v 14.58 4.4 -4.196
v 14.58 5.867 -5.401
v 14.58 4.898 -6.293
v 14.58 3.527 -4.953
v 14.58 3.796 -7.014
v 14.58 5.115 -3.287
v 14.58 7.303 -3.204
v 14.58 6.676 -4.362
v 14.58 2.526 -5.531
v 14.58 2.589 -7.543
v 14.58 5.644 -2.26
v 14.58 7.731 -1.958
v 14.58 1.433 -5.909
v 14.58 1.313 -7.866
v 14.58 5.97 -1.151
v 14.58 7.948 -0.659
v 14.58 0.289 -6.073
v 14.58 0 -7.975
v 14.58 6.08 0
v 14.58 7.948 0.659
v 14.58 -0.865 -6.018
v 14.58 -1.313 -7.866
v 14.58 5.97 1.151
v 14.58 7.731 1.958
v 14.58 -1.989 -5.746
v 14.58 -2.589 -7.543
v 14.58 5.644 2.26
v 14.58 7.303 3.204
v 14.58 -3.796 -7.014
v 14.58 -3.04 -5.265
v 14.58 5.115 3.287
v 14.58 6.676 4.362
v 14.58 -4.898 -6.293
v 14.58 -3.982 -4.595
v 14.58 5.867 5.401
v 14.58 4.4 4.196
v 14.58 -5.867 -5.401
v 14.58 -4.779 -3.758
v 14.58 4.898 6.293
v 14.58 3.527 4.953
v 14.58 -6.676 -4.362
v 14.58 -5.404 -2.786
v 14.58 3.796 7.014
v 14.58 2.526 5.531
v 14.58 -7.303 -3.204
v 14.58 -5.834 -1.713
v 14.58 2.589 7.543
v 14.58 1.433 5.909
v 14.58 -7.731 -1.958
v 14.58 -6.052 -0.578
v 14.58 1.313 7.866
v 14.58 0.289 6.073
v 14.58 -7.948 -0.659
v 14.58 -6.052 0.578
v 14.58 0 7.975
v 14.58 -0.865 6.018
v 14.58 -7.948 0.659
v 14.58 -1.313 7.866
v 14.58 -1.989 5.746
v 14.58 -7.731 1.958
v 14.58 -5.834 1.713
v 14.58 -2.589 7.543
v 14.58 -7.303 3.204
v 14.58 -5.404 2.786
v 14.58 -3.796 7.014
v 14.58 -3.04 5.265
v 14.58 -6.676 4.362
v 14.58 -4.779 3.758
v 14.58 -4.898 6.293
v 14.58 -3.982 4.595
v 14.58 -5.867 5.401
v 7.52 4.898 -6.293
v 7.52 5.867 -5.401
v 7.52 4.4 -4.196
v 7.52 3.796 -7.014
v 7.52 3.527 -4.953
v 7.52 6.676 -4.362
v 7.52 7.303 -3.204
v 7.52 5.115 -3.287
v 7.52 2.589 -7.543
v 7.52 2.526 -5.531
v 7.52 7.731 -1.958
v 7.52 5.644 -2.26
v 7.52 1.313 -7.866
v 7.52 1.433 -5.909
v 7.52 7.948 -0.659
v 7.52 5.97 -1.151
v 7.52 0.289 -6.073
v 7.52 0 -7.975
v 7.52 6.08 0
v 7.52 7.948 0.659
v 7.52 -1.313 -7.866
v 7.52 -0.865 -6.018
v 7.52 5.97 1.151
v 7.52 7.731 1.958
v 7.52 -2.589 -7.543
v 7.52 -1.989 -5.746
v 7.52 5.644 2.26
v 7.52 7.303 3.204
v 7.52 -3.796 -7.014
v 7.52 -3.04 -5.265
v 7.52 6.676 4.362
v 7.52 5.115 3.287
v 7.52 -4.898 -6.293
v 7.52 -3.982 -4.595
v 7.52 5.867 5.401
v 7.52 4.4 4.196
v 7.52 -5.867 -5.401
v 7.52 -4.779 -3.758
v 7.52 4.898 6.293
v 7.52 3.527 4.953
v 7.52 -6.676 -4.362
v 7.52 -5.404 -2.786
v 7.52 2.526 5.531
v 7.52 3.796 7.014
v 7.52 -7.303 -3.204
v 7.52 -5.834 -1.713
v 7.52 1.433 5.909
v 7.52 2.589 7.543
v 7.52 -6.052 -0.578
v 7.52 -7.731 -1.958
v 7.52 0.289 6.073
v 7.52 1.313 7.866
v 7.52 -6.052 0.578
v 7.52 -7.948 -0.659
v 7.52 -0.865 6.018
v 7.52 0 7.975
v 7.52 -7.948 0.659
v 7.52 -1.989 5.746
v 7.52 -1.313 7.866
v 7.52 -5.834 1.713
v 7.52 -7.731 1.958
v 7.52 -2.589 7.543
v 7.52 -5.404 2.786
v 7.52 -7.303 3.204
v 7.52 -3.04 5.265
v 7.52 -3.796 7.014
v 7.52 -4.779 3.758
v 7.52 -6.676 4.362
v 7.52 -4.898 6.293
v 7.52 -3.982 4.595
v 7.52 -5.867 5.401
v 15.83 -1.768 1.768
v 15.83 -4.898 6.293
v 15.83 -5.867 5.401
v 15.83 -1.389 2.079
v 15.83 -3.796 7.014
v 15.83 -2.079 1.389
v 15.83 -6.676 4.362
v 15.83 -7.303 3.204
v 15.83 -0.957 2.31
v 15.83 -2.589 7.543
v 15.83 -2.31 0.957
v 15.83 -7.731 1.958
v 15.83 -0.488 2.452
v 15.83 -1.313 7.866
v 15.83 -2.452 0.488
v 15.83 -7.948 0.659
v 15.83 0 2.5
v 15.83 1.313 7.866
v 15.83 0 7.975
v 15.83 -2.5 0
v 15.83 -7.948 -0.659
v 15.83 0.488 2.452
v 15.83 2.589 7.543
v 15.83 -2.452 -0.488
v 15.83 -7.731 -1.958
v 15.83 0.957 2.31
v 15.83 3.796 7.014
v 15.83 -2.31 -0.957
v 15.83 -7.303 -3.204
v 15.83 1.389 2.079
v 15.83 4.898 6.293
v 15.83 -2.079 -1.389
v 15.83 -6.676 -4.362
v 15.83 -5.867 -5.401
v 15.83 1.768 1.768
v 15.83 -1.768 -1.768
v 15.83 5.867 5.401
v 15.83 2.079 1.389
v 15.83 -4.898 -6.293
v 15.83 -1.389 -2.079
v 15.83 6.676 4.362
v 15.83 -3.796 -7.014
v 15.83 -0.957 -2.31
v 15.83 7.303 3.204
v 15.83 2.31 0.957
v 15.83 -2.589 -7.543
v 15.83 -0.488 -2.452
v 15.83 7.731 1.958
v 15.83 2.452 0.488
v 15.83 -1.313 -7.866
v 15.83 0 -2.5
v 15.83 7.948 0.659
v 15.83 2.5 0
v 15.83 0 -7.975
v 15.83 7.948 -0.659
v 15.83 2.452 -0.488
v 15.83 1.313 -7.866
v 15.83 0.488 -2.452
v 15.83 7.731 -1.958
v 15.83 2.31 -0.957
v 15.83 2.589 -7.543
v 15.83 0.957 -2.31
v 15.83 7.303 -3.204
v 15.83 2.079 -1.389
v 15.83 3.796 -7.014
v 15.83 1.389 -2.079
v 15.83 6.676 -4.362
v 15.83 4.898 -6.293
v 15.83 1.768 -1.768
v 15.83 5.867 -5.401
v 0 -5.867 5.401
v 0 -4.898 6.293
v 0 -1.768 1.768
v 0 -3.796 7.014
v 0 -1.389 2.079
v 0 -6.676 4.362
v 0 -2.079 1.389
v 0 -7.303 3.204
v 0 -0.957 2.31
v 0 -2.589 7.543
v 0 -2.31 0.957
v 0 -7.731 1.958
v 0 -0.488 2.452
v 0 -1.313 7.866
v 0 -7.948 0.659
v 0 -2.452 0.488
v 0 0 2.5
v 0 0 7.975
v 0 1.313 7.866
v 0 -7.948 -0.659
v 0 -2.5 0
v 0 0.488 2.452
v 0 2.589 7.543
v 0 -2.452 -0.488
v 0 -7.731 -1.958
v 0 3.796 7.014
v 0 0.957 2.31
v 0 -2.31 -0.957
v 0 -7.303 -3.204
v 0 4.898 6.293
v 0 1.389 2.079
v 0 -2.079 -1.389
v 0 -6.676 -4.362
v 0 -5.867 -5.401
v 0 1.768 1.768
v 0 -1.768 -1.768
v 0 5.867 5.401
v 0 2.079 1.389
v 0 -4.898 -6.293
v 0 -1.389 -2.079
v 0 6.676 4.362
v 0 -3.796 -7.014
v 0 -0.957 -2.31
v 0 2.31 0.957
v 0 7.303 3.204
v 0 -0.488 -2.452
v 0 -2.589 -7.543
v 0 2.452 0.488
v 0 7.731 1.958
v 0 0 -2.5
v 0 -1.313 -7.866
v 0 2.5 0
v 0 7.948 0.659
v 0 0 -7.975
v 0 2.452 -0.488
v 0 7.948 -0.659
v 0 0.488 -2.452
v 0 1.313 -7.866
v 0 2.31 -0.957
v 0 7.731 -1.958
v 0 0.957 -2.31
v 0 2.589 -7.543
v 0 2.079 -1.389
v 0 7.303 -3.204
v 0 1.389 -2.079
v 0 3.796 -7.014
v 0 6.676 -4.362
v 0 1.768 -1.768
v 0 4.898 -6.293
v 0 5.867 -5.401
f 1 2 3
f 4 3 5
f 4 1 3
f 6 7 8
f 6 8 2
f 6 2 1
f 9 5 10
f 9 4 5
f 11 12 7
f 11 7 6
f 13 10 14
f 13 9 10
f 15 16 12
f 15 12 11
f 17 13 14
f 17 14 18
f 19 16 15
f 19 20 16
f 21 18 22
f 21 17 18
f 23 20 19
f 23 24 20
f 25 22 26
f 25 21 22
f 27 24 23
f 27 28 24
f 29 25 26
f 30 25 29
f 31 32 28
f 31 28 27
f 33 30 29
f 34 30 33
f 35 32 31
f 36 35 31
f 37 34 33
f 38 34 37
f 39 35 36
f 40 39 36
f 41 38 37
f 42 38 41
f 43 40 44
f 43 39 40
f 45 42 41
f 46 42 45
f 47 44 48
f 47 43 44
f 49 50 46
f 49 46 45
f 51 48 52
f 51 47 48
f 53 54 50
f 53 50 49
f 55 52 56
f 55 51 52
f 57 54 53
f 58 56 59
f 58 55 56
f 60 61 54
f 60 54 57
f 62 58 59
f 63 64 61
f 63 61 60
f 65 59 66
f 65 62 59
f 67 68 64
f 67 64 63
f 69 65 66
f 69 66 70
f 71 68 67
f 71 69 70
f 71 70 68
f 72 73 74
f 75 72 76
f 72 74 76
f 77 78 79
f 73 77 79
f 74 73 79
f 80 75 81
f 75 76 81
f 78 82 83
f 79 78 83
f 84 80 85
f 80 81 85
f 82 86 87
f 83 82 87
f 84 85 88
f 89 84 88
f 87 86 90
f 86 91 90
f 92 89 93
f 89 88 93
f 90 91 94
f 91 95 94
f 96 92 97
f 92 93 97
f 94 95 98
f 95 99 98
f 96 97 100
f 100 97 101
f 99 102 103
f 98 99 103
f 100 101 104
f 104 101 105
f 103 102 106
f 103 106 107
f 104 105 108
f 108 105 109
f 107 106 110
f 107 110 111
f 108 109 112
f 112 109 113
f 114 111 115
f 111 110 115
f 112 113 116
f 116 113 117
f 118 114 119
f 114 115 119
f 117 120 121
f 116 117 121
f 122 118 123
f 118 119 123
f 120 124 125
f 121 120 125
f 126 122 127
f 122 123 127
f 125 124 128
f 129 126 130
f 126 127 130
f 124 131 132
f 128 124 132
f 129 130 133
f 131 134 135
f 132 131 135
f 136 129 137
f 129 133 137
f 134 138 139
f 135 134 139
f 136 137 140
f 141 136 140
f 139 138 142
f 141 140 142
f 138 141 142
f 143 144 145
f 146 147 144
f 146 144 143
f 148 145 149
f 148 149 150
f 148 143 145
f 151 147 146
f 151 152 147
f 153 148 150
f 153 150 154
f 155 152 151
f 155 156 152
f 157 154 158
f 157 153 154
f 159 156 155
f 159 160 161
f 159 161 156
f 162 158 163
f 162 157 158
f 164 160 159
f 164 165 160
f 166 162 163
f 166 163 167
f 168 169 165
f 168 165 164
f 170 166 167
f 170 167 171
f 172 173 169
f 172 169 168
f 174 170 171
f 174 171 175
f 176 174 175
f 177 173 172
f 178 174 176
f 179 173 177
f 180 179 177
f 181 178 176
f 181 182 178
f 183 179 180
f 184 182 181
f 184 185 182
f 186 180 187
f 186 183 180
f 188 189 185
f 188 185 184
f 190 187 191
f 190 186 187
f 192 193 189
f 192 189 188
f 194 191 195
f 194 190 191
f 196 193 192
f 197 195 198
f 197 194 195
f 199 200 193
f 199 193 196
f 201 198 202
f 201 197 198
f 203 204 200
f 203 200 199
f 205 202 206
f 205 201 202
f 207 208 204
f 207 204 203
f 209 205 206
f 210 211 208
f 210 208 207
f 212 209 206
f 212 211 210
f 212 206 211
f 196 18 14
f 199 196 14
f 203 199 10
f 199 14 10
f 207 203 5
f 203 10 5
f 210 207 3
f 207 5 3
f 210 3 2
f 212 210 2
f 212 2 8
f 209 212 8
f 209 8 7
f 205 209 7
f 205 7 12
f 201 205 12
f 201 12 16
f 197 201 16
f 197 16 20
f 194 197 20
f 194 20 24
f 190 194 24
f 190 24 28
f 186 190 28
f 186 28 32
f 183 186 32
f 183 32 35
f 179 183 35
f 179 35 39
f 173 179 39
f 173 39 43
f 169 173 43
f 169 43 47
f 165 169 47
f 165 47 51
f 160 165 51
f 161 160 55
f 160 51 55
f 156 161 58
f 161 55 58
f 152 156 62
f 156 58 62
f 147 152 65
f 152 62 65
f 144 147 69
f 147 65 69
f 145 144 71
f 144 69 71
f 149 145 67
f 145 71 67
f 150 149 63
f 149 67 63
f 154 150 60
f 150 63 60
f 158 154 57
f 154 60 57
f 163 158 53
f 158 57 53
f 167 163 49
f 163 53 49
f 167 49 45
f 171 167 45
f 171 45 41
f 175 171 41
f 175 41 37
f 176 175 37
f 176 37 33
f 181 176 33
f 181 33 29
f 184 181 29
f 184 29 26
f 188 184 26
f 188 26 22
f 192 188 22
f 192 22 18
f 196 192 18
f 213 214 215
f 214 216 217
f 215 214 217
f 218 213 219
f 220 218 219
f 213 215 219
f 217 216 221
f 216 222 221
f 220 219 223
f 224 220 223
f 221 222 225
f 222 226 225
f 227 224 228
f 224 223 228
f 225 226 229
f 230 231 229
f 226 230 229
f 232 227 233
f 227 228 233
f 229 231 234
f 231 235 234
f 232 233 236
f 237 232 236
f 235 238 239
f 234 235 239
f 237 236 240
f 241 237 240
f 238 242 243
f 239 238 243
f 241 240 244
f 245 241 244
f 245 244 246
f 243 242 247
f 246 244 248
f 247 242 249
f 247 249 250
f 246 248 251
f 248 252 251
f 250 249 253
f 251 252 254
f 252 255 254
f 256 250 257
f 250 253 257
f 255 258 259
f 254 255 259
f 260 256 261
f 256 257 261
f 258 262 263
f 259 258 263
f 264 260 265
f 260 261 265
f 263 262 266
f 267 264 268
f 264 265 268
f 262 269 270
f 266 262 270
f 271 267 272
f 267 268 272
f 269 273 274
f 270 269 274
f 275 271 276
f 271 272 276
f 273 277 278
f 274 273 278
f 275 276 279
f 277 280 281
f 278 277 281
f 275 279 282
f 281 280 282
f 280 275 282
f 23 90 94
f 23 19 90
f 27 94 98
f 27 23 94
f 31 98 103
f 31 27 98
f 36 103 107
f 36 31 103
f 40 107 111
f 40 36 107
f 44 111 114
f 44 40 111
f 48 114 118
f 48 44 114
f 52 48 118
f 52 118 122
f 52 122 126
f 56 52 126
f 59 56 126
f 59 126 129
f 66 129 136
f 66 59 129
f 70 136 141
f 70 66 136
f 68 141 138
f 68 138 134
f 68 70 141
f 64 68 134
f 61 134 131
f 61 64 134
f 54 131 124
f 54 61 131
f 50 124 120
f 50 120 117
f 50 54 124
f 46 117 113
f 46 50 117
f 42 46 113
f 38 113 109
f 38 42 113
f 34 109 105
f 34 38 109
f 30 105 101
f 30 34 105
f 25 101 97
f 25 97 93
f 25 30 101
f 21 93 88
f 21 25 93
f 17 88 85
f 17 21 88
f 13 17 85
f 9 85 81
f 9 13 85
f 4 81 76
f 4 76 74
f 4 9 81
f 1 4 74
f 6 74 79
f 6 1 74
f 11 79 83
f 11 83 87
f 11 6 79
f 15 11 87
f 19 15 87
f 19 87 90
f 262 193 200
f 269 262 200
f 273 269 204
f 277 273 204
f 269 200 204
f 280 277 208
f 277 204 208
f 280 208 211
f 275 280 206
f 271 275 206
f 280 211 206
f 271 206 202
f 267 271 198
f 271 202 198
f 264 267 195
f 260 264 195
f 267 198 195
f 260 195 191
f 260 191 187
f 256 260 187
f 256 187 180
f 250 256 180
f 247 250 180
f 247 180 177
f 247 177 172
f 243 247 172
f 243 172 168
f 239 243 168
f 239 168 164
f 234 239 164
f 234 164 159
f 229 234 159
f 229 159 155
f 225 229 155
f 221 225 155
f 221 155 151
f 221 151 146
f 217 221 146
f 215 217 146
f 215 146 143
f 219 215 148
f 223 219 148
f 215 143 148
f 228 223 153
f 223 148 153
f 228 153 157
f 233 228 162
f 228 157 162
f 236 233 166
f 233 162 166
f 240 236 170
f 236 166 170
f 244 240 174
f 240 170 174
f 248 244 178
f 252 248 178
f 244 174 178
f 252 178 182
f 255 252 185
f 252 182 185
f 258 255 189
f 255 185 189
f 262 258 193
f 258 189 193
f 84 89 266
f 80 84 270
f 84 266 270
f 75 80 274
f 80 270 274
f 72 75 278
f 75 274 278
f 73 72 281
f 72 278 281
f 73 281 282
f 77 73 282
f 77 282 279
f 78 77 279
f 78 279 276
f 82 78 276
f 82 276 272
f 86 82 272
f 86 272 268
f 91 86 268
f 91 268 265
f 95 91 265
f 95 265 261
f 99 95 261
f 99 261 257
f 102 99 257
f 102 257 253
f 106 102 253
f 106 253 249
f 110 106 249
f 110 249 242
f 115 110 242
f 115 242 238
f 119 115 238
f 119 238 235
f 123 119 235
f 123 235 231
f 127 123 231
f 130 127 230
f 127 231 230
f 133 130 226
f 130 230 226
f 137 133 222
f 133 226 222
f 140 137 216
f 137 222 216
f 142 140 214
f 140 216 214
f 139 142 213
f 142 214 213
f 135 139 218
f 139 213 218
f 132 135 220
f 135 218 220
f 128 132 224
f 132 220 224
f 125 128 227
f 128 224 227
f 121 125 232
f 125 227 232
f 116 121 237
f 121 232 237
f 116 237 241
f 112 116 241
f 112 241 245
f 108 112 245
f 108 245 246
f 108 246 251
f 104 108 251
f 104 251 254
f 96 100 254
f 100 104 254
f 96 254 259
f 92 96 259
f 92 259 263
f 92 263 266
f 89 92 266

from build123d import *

# Parameters (mm, degrees)
SKETCH1_R           = 7.975
BOSS_EXTRUDE1_DEPTH = 15.83
SKETCH2_W           = 7.06
SKETCH2_H           = 1.895
SKETCH3_R           = 2.5
CUT_EXTRUDE1_DEPTH  = 16.83


with BuildPart() as part:
    # Sketch1 → Boss-Extrude1 (new body)
    with BuildSketch(Plane(origin=(0, 0, 0), x_dir=(0, 0, -1), z_dir=(1, 0, 0))):
        Circle(SKETCH1_R)
    extrude(amount=BOSS_EXTRUDE1_DEPTH)

    # Sketch2 → Cut-Revolve1 (revolve, cut)
    with BuildSketch(Plane.XY):
        with Locations((11.05, 7.0275)):
            Rectangle(SKETCH2_W, SKETCH2_H)
    revolve(axis=Axis((0, 0, 0), (1, 0, 0)), mode=Mode.SUBTRACT)

    # Sketch3 → Cut-Extrude1 (cut, through all)
    with BuildSketch(Plane(origin=(15.83, 0, 0), x_dir=(0, 0, -1), z_dir=(1, 0, 0))):
        Circle(SKETCH3_R)
    extrude(amount=-CUT_EXTRUDE1_DEPTH, mode=Mode.SUBTRACT)


solid = part.part
